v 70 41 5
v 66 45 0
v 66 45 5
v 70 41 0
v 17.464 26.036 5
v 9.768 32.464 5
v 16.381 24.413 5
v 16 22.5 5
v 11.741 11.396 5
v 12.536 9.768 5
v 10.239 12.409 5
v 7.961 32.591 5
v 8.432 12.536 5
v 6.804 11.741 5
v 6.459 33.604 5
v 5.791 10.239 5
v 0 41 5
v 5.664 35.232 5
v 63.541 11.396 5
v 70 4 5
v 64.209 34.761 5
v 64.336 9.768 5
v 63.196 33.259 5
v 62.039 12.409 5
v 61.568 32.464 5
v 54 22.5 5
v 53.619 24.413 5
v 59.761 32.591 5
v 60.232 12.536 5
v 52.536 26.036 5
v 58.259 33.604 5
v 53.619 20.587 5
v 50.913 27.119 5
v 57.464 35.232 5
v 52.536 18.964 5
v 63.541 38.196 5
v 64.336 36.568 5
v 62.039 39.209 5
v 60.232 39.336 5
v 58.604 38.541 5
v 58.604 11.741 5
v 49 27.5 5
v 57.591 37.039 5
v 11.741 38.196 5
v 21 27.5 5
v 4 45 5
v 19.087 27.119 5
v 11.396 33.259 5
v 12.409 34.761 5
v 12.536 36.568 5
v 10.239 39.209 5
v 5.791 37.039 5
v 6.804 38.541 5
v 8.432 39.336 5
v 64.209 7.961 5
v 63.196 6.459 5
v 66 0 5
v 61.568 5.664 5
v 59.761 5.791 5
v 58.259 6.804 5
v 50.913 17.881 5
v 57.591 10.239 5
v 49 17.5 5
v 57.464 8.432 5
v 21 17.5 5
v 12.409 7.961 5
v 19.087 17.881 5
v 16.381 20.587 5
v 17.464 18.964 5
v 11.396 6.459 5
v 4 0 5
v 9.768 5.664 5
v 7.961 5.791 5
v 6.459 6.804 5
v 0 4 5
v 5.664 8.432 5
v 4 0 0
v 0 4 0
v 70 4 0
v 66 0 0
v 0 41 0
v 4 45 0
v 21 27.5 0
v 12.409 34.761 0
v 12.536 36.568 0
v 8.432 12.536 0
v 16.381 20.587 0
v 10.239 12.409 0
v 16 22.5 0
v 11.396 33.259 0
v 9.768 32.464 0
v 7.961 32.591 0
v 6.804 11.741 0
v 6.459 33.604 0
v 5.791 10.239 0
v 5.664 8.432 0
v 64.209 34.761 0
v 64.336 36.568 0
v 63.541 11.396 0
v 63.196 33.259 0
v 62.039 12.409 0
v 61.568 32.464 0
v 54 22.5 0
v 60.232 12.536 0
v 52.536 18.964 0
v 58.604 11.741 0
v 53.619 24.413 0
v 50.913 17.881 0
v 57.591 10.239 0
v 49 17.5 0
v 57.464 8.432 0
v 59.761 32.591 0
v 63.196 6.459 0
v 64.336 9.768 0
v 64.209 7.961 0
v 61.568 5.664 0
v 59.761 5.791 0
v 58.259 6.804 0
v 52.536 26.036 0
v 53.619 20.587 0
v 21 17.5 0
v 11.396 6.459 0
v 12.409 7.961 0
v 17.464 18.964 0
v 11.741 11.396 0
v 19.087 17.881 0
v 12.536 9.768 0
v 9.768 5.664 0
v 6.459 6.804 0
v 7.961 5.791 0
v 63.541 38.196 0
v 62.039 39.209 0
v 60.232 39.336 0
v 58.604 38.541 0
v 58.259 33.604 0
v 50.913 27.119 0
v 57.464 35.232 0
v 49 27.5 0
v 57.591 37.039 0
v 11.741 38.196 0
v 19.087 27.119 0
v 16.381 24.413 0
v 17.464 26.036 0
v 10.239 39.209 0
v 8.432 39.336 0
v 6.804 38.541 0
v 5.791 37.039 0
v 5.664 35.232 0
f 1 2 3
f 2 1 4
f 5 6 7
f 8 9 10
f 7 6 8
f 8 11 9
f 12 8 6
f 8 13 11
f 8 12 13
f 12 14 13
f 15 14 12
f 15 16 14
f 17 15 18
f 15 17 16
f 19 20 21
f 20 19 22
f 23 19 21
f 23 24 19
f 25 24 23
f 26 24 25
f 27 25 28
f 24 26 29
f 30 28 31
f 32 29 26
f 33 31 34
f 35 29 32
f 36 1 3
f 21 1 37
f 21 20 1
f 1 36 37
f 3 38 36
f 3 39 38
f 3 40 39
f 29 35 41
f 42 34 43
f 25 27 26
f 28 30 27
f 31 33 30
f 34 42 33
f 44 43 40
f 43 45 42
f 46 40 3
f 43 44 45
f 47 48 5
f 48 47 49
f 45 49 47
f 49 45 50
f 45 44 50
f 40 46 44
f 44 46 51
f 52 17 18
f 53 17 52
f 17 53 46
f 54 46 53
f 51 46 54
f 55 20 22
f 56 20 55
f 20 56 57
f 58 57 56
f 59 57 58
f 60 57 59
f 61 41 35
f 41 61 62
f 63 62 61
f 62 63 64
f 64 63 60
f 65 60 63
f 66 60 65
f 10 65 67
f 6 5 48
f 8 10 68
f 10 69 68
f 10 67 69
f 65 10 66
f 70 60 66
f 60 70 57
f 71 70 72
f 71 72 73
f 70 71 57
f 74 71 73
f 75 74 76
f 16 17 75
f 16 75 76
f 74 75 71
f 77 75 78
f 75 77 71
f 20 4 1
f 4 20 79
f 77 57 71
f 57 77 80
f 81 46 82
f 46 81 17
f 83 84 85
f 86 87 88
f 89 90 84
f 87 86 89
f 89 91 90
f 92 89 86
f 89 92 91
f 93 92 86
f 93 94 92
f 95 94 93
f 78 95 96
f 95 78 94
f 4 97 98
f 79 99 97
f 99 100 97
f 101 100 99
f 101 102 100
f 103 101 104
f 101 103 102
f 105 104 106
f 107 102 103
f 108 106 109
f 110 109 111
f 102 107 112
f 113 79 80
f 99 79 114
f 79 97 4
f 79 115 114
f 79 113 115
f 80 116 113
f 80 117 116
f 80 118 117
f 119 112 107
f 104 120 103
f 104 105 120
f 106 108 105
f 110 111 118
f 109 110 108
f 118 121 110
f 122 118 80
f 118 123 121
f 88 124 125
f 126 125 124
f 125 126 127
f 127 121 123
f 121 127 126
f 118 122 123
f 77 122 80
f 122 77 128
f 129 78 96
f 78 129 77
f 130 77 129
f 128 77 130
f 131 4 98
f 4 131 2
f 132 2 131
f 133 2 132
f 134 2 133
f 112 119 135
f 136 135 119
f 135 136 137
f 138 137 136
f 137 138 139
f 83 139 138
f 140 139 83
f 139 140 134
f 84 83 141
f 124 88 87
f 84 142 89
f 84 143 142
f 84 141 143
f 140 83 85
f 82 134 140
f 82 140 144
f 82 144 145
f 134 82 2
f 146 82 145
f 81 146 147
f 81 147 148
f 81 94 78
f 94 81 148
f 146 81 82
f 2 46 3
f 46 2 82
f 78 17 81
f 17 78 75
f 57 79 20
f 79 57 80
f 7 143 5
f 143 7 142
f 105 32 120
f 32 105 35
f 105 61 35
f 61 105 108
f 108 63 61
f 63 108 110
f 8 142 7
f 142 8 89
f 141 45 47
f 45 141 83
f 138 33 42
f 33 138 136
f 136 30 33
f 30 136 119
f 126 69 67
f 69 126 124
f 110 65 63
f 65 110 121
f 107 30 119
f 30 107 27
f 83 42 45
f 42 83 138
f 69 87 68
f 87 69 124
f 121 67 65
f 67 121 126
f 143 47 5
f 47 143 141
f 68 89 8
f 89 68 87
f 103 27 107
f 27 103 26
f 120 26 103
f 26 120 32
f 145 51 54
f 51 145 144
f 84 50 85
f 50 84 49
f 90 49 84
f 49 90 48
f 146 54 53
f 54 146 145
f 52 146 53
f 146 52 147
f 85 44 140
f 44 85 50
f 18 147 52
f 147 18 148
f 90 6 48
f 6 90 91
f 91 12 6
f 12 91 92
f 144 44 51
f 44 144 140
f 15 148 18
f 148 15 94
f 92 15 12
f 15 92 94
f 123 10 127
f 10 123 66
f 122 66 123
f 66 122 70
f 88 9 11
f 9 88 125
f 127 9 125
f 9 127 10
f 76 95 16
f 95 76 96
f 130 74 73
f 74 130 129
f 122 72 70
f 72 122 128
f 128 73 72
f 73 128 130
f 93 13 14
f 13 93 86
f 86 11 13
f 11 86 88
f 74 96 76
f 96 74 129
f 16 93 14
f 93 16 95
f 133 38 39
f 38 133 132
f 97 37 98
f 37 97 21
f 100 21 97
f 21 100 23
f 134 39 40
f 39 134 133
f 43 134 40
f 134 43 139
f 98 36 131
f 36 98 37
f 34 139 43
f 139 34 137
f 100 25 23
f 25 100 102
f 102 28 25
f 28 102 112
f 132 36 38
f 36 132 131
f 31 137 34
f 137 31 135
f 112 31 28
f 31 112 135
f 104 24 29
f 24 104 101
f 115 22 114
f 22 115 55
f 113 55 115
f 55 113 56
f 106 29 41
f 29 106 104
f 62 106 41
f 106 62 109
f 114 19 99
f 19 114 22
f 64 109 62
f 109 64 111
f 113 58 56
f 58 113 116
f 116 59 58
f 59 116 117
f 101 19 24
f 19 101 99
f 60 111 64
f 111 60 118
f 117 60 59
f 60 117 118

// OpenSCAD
$fn = 32;
// target_bbox: 70, 45, 5
// ----------------------------------------------------------------------
// Bracket plate: slot plate 70 x 45
// ----------------------------------------------------------------------

// --- parameters (mm) ---
hole_r = 3.5;             // bolt hole radius
plate_t = 5;              // plate thickness, Z (extrusion height)
plate_l = 70;             // plate length
plate_w = 45;             // plate width
slot_l = 28;              // slot straight length
slot_r = 5;               // slot end radius

slot_len = slot_l + 2 * slot_r;
slot_w = 2 * slot_r;
hole_d2 = 2 * hole_r;

profile = [[4, 0], [66, 0], [70, 4], [70, 41], [66, 45], [4, 45], [0, 41], [0, 4]];  // primary outline, 8 points, counter clockwise
void_1 = [[49, 17.5], [50.913, 17.881], [52.536, 18.964], [53.619, 20.587], [54, 22.5], [53.619, 24.413], [52.536, 26.036], [50.913, 27.119], [49, 27.5], [21, 27.5], [19.087, 27.119], [17.464, 26.036], [16.381, 24.413], [16, 22.5], [16.381, 20.587], [17.464, 18.964], [19.087, 17.881], [21, 17.5]];  // grip slot, 18 points
void_2 = [[12.536, 36.568], [11.741, 38.196], [10.239, 39.209], [8.432, 39.336], [6.804, 38.541], [5.791, 37.039], [5.664, 35.232], [6.459, 33.604], [7.961, 32.591], [9.768, 32.464], [11.396, 33.259], [12.409, 34.761]];  // corner hole, 12 points
void_3 = [[12.536, 9.768], [11.741, 11.396], [10.239, 12.409], [8.432, 12.536], [6.804, 11.741], [5.791, 10.239], [5.664, 8.432], [6.459, 6.804], [7.961, 5.791], [9.768, 5.664], [11.396, 6.459], [12.409, 7.961]];  // corner hole, 12 points
void_4 = [[64.336, 36.568], [63.541, 38.196], [62.039, 39.209], [60.232, 39.336], [58.604, 38.541], [57.591, 37.039], [57.464, 35.232], [58.259, 33.604], [59.761, 32.591], [61.568, 32.464], [63.196, 33.259], [64.209, 34.761]];  // corner hole, 12 points
void_5 = [[64.336, 9.768], [63.541, 11.396], [62.039, 12.409], [60.232, 12.536], [58.604, 11.741], [57.591, 10.239], [57.464, 8.432], [58.259, 6.804], [59.761, 5.791], [61.568, 5.664], [63.196, 6.459], [64.209, 7.961]];  // corner hole, 12 points

// --- the one profile operation ---
difference() {
  linear_extrude(height = plate_t) polygon(points = profile);
  translate([0, 0, -1])
    linear_extrude(height = plate_t + 2) polygon(points = void_1);
  translate([0, 0, -1])
    linear_extrude(height = plate_t + 2) polygon(points = void_2);
  translate([0, 0, -1])
    linear_extrude(height = plate_t + 2) polygon(points = void_3);
  translate([0, 0, -1])
    linear_extrude(height = plate_t + 2) polygon(points = void_4);
  translate([0, 0, -1])
    linear_extrude(height = plate_t + 2) polygon(points = void_5);
}
